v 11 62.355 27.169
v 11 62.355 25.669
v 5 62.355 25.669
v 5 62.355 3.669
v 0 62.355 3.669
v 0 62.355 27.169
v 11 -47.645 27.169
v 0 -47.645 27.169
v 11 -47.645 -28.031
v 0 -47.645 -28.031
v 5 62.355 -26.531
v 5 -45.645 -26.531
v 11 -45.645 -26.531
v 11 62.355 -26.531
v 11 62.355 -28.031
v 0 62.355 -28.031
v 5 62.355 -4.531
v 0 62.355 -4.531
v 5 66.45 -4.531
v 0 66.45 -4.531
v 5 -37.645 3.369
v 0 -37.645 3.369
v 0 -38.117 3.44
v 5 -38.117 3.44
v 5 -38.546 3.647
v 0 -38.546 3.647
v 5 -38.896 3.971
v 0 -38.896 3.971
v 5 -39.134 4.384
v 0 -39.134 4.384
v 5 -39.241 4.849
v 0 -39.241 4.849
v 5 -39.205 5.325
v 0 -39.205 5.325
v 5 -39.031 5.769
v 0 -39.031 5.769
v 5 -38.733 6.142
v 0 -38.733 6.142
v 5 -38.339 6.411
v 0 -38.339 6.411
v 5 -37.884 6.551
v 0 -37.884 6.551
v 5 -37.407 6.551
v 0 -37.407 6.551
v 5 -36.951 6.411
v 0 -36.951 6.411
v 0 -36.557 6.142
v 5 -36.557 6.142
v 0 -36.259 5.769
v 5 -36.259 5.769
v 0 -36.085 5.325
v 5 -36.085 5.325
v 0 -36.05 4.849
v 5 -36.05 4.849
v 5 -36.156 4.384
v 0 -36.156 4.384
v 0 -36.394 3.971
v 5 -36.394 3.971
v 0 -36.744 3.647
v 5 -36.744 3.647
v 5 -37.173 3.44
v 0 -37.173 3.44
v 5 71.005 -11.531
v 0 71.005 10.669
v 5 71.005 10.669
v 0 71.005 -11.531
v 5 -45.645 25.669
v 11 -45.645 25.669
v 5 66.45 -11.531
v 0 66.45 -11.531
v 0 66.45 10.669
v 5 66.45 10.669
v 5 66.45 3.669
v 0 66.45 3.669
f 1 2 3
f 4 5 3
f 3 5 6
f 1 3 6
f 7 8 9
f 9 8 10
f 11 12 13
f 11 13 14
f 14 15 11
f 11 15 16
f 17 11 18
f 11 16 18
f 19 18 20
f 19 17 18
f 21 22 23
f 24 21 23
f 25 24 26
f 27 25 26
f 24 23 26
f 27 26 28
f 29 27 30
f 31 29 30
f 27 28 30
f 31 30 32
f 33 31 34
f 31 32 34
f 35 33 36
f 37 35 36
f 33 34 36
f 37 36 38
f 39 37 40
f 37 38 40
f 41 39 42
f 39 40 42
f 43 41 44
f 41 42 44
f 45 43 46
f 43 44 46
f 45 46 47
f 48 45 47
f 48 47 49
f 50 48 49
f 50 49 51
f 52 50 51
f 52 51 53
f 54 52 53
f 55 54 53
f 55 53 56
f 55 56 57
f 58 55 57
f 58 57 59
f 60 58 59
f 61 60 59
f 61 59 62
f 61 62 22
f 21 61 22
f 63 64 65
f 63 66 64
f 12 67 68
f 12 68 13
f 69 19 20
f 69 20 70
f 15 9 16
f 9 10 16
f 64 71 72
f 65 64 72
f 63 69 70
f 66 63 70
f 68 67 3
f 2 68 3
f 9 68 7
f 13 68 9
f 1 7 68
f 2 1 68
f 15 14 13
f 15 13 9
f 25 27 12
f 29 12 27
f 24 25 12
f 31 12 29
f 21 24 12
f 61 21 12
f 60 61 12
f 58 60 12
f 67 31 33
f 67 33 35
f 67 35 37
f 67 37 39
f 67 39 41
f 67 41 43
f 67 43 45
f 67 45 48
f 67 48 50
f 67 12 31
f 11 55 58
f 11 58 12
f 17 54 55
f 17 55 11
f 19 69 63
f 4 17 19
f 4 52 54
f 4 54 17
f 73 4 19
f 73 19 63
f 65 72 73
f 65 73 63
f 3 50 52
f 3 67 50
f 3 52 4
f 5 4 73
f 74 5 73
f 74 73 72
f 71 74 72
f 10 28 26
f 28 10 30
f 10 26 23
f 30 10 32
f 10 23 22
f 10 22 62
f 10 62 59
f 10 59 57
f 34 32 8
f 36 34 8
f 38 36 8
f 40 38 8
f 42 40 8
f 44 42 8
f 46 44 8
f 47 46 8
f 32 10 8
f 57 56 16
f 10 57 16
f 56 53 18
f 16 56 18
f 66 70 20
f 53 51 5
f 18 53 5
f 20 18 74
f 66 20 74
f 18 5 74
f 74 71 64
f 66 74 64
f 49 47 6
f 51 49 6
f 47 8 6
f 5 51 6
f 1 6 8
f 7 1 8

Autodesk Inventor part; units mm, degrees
ref_plane "YZ Plane" through (0, 0, 0) normal (1, 0, 0) x (0, 1, 0)
ref_plane "XZ Plane" through (0, 0, 0) normal (0, 1, 0) x (-1, 0, 0)
ref_plane "XY Plane" through (0, 0, 0) normal (0, 0, 1) x (1, 0, 0)
sketch "Sketch1" plane through (0, 0, 0) normal (1, 0, 0) x (0, 1, 0)
  line L0 (62.3549, 27.169) -> (-47.6451, 27.169)
  line L1 (-47.6451, 27.169) -> (-47.6451, -28.031)
  line L2 (-47.6451, -28.031) -> (62.3549, -28.031)
  line L3 (62.3549, -28.031) -> (62.3549, 27.169)
  point P0 (0, 0)
  dimension "d0" = 110
  dimension "d1" = 55.2
extrude "Extrusion1" add sketch "Sketch1" along normal blind 5
sketch "Sketch3" plane through (5, 0, 0) normal (1, 0, 0) x (0, 0, -1)
  line L0 (-27.169, -47.6451) -> (28.031, -47.6451) projected
  line L1 (28.031, -47.6451) -> (-4.969, -47.6451)
  line L2 (-4.969, -47.6451) -> (-4.969, -37.6451)
  point P0 (0, 0)
  dimension "d12" = 33
  dimension "d13" = 10
hole "Hole2" at (5, -37.6451, 4.969) direction (-1, 0, 0) diameter 3.2 end through all
sketch "Sketch13" plane through (5, 0, 0) normal (1, 0, 0) x (0, 0, -1)
  line L0 (-27.169, -47.6451) -> (28.031, -47.6451) projected
  line L1 (28.031, 62.3549) -> (-27.169, 62.3549) projected
  line L2 (28.031, -47.6451) -> (26.531, -47.6451)
  line L3 (26.531, -47.6451) -> (26.531, 62.3549)
  line L4 (26.531, 62.3549) -> (28.031, 62.3549)
  line L5 (28.031, 62.3549) -> (28.031, -47.6451)
  line L6 (-27.169, 62.3549) -> (-27.169, -47.6451) projected
  line L7 (28.031, 62.3549) -> (-27.169, 62.3549) projected
  line L8 (-27.169, -47.6451) -> (-25.669, -47.6451)
  line L9 (-25.669, -47.6451) -> (-25.669, 62.3549)
  line L10 (-25.669, 62.3549) -> (-27.169, 62.3549)
  line L11 (-27.169, 62.3549) -> (-27.169, -47.6451)
  line L12 (28.031, -47.6451) -> (-27.169, -47.6451)
  line L13 (-27.169, -47.6451) -> (-27.169, -45.6451)
  line L14 (-27.169, -45.6451) -> (28.031, -45.6451)
  line L15 (28.031, -45.6451) -> (28.031, -47.6451)
  point P0 (0, 0)
  point P1 (10.031, 62.3549)
  point P2 (-5.969, 62.3549)
  point P3 (26.531, -45.6451)
  point P4 (-25.669, -45.6451)
  point P5 (18.031, 62.3549)
  dimension "d42" = 1.5
  dimension "d43" = 1.5
  dimension "d44" = 2
extrude "Extrusion7" add sketch "Sketch13" along normal blind 6 contours L6 L14 L9 L0 | L9 L14 L3 L0 | L6 L1 L9 L14 | L3 L14 L5 L0 | L3 L1 L5 L14
sketch "Sketch14" plane through (0, 62.3549, 27.169) normal (0, 1, 0) x (1, 0, 0)
  line L0 (5, 1.5) -> (5, 53.7) projected
  line L1 (5, 53.7) -> (5, 38.7)
  line L2 (5, 1.5) -> (5, 16.5)
  line L3 (5, 38.7) -> (0, 38.7)
  line L4 (5, 21.7) -> (5, 38.7)
  line L5 (0, 55.2) -> (0, 0) projected
  line L6 (5, 38.7) -> (0, 38.7)
  line L7 (0, 38.7) -> (0, 16.5)
  line L8 (0, 16.5) -> (5, 16.5)
  line L9 (5, 16.5) -> (5, 38.7)
  point P0 (0, 27.169)
  dimension "d47" = 15
  dimension "d48" = 15
extrude "Extrusion8" add sketch "Sketch14" along normal blind 8.65
sketch "Sketch15" plane through (5, 0, 0) normal (1, 0, 0) x (0, 0, -1)
  line L0 (28.031, 62.3549) -> (11.531, 62.3549) projected
  line L1 (11.531, 62.3549) -> (4.531, 62.3549)
  line L2 (4.531, 62.3549) -> (4.531, 66.4495)
  line L3 (4.531, 66.4495) -> (11.531, 66.4495)
  line L4 (11.531, 66.4495) -> (11.531, 62.3549)
  line L5 (-10.669, 62.3549) -> (-25.669, 62.3549) projected
  line L6 (-10.669, 62.3549) -> (-3.669, 62.3549)
  line L7 (-3.669, 62.3549) -> (-3.669, 66.4495)
  line L8 (-3.669, 66.4495) -> (-10.669, 66.4495)
  line L9 (-10.669, 66.4495) -> (-10.669, 62.3549)
  point P0 (0, 0)
  dimension "d51" = 7
  dimension "d52" = 7
  dimension "d55" = 4.0946
extrude "Extrusion9" cut sketch "Sketch15" against normal blind 8.65
properties part number "pumpholderfinal"
